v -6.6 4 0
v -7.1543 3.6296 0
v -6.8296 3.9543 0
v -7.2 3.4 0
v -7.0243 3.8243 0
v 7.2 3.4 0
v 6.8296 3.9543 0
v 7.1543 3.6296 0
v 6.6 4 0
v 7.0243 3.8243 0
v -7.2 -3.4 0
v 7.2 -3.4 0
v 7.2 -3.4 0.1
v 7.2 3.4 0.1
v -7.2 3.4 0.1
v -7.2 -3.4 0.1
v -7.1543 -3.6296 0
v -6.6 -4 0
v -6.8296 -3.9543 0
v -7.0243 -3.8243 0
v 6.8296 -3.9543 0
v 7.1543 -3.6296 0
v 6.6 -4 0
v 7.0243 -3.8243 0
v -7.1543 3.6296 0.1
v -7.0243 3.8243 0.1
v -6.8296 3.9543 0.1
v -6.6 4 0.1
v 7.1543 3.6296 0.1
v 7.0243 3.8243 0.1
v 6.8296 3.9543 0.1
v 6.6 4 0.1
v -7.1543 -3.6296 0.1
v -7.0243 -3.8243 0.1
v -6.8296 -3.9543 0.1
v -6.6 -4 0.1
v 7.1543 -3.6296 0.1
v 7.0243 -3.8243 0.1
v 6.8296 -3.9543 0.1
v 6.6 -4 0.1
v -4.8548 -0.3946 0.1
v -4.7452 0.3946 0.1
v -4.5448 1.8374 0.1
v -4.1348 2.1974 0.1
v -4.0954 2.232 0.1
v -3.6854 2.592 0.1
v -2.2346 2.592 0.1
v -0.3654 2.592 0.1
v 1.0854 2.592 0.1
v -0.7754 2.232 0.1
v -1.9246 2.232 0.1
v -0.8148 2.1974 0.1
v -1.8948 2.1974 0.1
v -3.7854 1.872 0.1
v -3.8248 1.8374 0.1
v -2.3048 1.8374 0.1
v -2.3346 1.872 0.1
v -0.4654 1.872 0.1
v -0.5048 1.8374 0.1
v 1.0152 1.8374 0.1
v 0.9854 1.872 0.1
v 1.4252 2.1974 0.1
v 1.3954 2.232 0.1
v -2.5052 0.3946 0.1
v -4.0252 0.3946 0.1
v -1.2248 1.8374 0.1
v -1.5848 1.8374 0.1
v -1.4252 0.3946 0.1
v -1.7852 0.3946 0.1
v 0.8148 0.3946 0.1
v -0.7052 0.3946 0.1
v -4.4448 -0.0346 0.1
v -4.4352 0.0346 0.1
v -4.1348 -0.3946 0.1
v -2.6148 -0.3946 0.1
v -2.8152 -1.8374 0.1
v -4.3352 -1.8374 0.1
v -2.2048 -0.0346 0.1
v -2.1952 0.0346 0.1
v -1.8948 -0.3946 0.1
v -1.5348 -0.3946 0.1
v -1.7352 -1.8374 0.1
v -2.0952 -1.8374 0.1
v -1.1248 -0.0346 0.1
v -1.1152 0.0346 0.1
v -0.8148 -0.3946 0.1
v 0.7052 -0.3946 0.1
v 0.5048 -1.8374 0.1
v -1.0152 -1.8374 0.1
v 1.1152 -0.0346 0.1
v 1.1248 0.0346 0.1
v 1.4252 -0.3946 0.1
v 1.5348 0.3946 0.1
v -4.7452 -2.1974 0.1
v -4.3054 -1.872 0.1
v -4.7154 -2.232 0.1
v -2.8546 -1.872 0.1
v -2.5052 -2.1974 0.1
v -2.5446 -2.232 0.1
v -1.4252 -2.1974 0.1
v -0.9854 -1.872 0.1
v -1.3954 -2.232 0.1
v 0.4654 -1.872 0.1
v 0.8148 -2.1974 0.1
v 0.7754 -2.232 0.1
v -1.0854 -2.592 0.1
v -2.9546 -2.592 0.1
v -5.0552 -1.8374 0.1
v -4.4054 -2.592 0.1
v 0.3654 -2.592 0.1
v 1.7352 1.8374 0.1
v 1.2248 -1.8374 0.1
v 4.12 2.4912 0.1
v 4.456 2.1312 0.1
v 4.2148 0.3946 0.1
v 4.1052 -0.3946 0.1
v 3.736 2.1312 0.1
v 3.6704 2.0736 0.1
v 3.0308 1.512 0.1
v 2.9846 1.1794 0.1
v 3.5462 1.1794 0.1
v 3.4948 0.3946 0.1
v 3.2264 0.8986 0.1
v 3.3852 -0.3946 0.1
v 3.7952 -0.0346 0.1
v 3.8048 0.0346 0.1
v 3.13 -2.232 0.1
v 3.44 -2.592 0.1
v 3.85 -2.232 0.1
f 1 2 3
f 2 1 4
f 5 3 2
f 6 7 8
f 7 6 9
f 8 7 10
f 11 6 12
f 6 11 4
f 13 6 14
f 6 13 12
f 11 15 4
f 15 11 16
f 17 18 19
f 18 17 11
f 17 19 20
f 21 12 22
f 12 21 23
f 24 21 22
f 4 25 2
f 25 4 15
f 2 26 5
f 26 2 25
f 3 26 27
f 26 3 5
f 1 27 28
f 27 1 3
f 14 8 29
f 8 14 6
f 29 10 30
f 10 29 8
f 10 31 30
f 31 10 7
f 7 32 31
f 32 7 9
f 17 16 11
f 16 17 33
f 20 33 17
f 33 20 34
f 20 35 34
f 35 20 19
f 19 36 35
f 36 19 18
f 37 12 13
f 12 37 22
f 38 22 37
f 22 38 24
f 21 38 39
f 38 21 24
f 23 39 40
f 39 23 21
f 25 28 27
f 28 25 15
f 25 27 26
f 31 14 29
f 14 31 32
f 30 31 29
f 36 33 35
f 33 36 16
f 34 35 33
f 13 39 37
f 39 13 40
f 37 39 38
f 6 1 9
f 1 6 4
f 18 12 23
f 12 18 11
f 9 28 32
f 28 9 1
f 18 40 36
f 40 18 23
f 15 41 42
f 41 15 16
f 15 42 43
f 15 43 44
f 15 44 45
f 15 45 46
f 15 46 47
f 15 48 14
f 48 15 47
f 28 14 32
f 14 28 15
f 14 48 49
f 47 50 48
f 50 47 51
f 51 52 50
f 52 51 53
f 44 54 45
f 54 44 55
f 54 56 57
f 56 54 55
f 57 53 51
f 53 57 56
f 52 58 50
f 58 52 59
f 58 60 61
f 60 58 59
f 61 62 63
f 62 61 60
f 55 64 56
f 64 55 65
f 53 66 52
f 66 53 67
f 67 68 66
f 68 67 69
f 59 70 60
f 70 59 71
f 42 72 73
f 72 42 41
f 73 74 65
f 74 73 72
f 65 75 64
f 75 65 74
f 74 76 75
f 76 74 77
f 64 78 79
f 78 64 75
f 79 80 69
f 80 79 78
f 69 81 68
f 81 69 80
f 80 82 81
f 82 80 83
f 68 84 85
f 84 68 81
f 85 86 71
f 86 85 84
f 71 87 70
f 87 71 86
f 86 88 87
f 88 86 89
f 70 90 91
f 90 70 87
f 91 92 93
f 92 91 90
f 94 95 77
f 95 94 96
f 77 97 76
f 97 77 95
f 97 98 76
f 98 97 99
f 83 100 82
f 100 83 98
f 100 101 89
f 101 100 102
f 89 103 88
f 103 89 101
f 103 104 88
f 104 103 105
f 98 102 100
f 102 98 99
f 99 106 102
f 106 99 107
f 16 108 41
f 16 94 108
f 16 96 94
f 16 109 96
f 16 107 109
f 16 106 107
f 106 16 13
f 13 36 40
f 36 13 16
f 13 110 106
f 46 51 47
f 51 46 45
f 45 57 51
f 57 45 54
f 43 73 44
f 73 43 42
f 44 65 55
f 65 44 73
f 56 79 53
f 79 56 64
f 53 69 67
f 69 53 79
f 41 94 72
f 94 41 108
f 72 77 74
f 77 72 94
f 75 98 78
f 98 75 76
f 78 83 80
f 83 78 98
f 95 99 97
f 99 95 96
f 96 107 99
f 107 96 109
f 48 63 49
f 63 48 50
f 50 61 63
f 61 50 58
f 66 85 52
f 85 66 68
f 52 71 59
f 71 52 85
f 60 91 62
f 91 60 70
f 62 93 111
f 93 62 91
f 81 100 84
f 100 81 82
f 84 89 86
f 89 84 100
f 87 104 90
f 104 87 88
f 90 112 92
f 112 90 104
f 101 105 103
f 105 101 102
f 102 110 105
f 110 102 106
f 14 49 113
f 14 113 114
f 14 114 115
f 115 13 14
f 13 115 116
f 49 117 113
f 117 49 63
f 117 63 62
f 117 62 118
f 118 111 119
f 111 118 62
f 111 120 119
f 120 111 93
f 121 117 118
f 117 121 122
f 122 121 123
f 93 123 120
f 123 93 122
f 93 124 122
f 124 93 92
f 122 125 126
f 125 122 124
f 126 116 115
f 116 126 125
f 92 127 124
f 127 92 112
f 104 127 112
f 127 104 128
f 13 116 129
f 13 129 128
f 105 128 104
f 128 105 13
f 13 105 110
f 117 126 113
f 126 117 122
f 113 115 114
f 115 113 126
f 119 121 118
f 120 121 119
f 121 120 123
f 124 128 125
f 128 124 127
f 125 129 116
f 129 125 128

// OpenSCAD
// file: ../p/box3u12.scad
use <../lib.scad>
function ldraw_lib__box3u12() = [
// 0 Box with 3 Parallel Faces without Any Edges
// 0 Name: box3u12.dat
// 0 Author: J.C. Tchang [tchang]
// 0 !LDRAW_ORG Primitive UPDATE 2014-02
// 0 !LICENSE Licensed under CC BY 4.0 : see CAreadme.txt
// 
// 0 BFC CERTIFY CCW
  [0,"BFC","CERTIFY"],
  [0,"BFC","CCW"],
// 
// 0 !HISTORY 2014-12-23 [PTadmin] Official Update 2014-02
// 
// 
// 4 16 -1 1 1 1 1 1 1 1 -1 -1 1 -1
  [4,16,-1,1,1,1,1,1,1,1,-1,-1,1,-1],
// 4 16 -1 1 1 -1 0 1 1 0 1 1 1 1
  [4,16,-1,1,1,-1,0,1,1,0,1,1,1,1],
// 4 16 1 1 -1 1 0 -1 -1 0 -1 -1 1 -1
  [4,16,1,1,-1,1,0,-1,-1,0,-1,-1,1,-1],
];
module ldraw_lib__box3u12(step=0, col=false, unit=2/5, alt=false, line=0.2, solid=!$preview)
    makepoly(ldraw_lib__box3u12(), step=step, col=col, unit=unit, alt=alt, line=line, solid=solid);
ldraw_lib__box3u12(line=0.2);
// file: ../p/1-4cyli.scad
use <../lib.scad>
function ldraw_lib__1_4cyli() = [
// 0 Cylinder 0.25
// 0 Name: 1-4cyli.dat
// 0 Author: James Jessiman
// 0 !LDRAW_ORG Primitive UPDATE 2012-01
// 0 !LICENSE Licensed under CC BY 4.0 : see CAreadme.txt
// 
// 0 BFC CERTIFY CCW
  [0,"BFC","CERTIFY"],
  [0,"BFC","CCW"],
// 
// 0 !HISTORY 2002-03-23 [sbliss] Added BFC statement.
// 0 !HISTORY 2002-04-25 [PTadmin] Official Update 2002-02
// 0 !HISTORY 2007-06-22 [PTadmin] Header formatted for Contributor Agreement
// 0 !HISTORY 2008-07-01 [PTadmin] Official Update 2008-01
// 0 !HISTORY 2012-02-16 [Philo] Changed to CCW
// 0 !HISTORY 2012-03-30 [PTadmin] Official Update 2012-01
// 
// 
// 4 16 1 1 0 0.9239 1 0.3827 0.9239 0 0.3827 1 0 0
  [4,16,1,1,0,0.9239,1,0.3827,0.9239,0,0.3827,1,0,0],
// 5 24 1 0 0 1 1 0 0.9239 0 0.3827 1 0 -1
  [5,24,1,0,0,1,1,0,0.9239,0,0.3827,1,0,-1],
// 4 16 0.9239 1 0.3827 0.7071 1 0.7071 0.7071 0 0.7071 0.9239 0 0.3827
  [4,16,0.9239,1,0.3827,0.7071,1,0.7071,0.7071,0,0.7071,0.9239,0,0.3827],
// 5 24 0.9239 0 0.3827 0.9239 1 0.3827 0.7071 0 0.7071 1 0 0
  [5,24,0.9239,0,0.3827,0.9239,1,0.3827,0.7071,0,0.7071,1,0,0],
// 4 16 0.7071 1 0.7071 0.3827 1 0.9239 0.3827 0 0.9239 0.7071 0 0.7071
  [4,16,0.7071,1,0.7071,0.3827,1,0.9239,0.3827,0,0.9239,0.7071,0,0.7071],
// 5 24 0.7071 0 0.7071 0.7071 1 0.7071 0.3827 0 0.9239 0.9239 0 0.3827
  [5,24,0.7071,0,0.7071,0.7071,1,0.7071,0.3827,0,0.9239,0.9239,0,0.3827],
// 4 16 0.3827 1 0.9239 0 1 1 0 0 1 0.3827 0 0.9239
  [4,16,0.3827,1,0.9239,0,1,1,0,0,1,0.3827,0,0.9239],
// 5 24 0.3827 0 0.9239 0.3827 1 0.9239 0 0 1 0.7071 0 0.7071
  [5,24,0.3827,0,0.9239,0.3827,1,0.9239,0,0,1,0.7071,0,0.7071],
// 5 24 0 0 1 0 1 1 0.3827 0 0.9239 -1 0 1
  [5,24,0,0,1,0,1,1,0.3827,0,0.9239,-1,0,1],
];
module ldraw_lib__1_4cyli(step=0, col=false, unit=2/5, alt=false, line=0.2, solid=!$preview)
    makepoly(ldraw_lib__1_4cyli(), step=step, col=col, unit=unit, alt=alt, line=line, solid=solid);
ldraw_lib__1_4cyli(line=0.2);
// file: ../p/1-4chrd.scad
use <../lib.scad>
function ldraw_lib__1_4chrd() = [
// 0 Chord 0.25
// 0 Name: 1-4chrd.dat
// 0 Author: Max Martin Richter [MMR1988]
// 0 !LDRAW_ORG Primitive UPDATE 2023-05
// 0 !LICENSE Licensed under CC BY 4.0 : see CAreadme.txt
// 
// 0 BFC CERTIFY CCW
  [0,"BFC","CERTIFY"],
  [0,"BFC","CCW"],
// 
// 0 !HISTORY 2004-04-22 [PTadmin] Official Update 2004-02
// 0 !HISTORY 2007-10-09 [PTadmin] Header formatted for Contributor Agreement
// 0 !HISTORY 2008-07-01 [PTadmin] Official Update 2008-01
// 0 !HISTORY 2012-08-02 [MMR1988] Re-creation with PrimGen2 and Rectifier
// 0 !HISTORY 2012-08-09 [PTadmin] Official Update 2012-02
// 0 !HISTORY 2023-10-27 [OrionP] Change author to MMR1988 from hafhead
// 0 !HISTORY 2023-10-31 [OrionP] Official Update 2023-05
// 
// 4 16 0.9239 0 0.3827 0.3827 0 0.9239 0 0 1 1 0 0
  [4,16,0.9239,0,0.3827,0.3827,0,0.9239,0,0,1,1,0,0],
// 3 16 0.7071 0 0.7071 0.3827 0 0.9239 0.9239 0 0.3827
  [3,16,0.7071,0,0.7071,0.3827,0,0.9239,0.9239,0,0.3827],
];
module ldraw_lib__1_4chrd(step=0, col=false, unit=2/5, alt=false, line=0.2, solid=!$preview)
    makepoly(ldraw_lib__1_4chrd(), step=step, col=col, unit=unit, alt=alt, line=line, solid=solid);
ldraw_lib__1_4chrd(line=0.2);
// main file
use <../lib.scad>
use <s/6221655aks01.scad>
function ldraw_lib__6221655ak() = [
// 0 Sticker  1.0 x  1.8 with Yellow Digital "1" on Black Background
// 0 Name: 6221655ak.dat
// 0 Author: Massimo Maso [Sirio]
// 0 !LDRAW_ORG Part UPDATE 2024-09
// 0 !LICENSE Licensed under CC BY 4.0 : see CAreadme.txt
// 
// 0 BFC CERTIFY CCW
  [0,"BFC","CERTIFY"],
  [0,"BFC","CCW"],
// 
// 0 !KEYWORDS 3.0, 911 RSR, Set 75888, Speed Champions, Turbo
// 
// 0 !HISTORY 2024-10-27 [OrionP] Official Update 2024-09
// 
// 0 // Subpart
// 1 16 0 0 0 1 0 0 0 1 0 0 0 1 s\6221655aks01.dat
  [1,16,0,0,0,1,0,0,0,1,0,0,0,1, ldraw_lib__s__6221655aks01()],
// 0 // Top face
// 0 // Black faces
// 3 0 18 -.25 8.5 2.7136 -.25 6.48 10.3 -.25 6.228
  [3,0,18,-.25,8.5,2.7136,-.25,6.48,10.3,-.25,6.228],
// 3 0 18 -.25 8.5 10.3 -.25 6.228 11.14 -.25 5.328
  [3,0,18,-.25,8.5,10.3,-.25,6.228,11.14,-.25,5.328],
// 3 0 18 -.25 8.5 11.14 -.25 5.328 10.537 -.25 .9864
  [3,0,18,-.25,8.5,11.14,-.25,5.328,10.537,-.25,.9864],
// 4 0 18 -.25 8.5 10.537 -.25 .9864 10.263 -.25 -.9864 18 -.25 -8.5
  [4,0,18,-.25,8.5,10.537,-.25,.9864,10.263,-.25,-.9864,18,-.25,-8.5],
// 4 0 9.34 -.25 5.328 10.3 -.25 6.228 2.7136 -.25 6.48 3.4886 -.25 5.58
  [4,0,9.34,-.25,5.328,10.3,-.25,6.228,2.7136,-.25,6.48,3.4886,-.25,5.58],
// 3 0 9.34 -.25 5.328 3.4886 -.25 5.58 3.563 -.25 5.4936
  [3,0,9.34,-.25,5.328,3.4886,-.25,5.58,3.563,-.25,5.4936],
// 3 0 9.34 -.25 5.328 3.563 -.25 5.4936 9.176 -.25 5.184
  [3,0,9.34,-.25,5.328,3.563,-.25,5.4936,9.176,-.25,5.184],
// 4 0 7.577 -.25 3.78 9.176 -.25 5.184 3.563 -.25 5.4936 4.338 -.25 4.5936
  [4,0,7.577,-.25,3.78,9.176,-.25,5.184,3.563,-.25,5.4936,4.338,-.25,4.5936],
// 4 0 7.577 -.25 3.78 4.338 -.25 4.5936 3.837 -.25 .9864 7.4615 -.25 2.9484
  [4,0,7.577,-.25,3.78,4.338,-.25,4.5936,3.837,-.25,.9864,7.4615,-.25,2.9484],
// 4 0 8.737 -.25 .9864 9.34 -.25 5.328 9.176 -.25 5.184 8.8655 -.25 2.9484
  [4,0,8.737,-.25,.9864,9.34,-.25,5.328,9.176,-.25,5.184,8.8655,-.25,2.9484],
// 3 0 8.737 -.25 .9864 8.8655 -.25 2.9484 8.066 -.25 2.2464
  [3,0,8.737,-.25,.9864,8.8655,-.25,2.9484,8.066,-.25,2.2464],
// 4 0 8.737 -.25 .9864 8.066 -.25 2.2464 7.4615 -.25 2.9484 3.837 -.25 .9864
  [4,0,8.737,-.25,.9864,8.066,-.25,2.2464,7.4615,-.25,2.9484,3.837,-.25,.9864],
// 4 0 8.737 -.25 .9864 3.837 -.25 .9864 3.563 -.25 -.9864 8.463 -.25 -.9864
  [4,0,8.737,-.25,.9864,3.837,-.25,.9864,3.563,-.25,-.9864,8.463,-.25,-.9864],
// 4 0 8.737 -.25 .9864 8.463 -.25 -.9864 9.488 -.25 -.0864 9.512 -.25 .0864
  [4,0,8.737,-.25,.9864,8.463,-.25,-.9864,9.488,-.25,-.0864,9.512,-.25,.0864],
// 4 0 10.537 -.25 .9864 9.512 -.25 .0864 9.488 -.25 -.0864 10.263 -.25 -.9864
  [4,0,10.537,-.25,.9864,9.512,-.25,.0864,9.488,-.25,-.0864,10.263,-.25,-.9864],
// 4 0 7.825 -.25 -5.58 8.463 -.25 -.9864 3.563 -.25 -.9864 3.062 -.25 -4.5936
  [4,0,7.825,-.25,-5.58,8.463,-.25,-.9864,3.563,-.25,-.9864,3.062,-.25,-4.5936],
// 4 0 7.825 -.25 -5.58 3.062 -.25 -4.5936 2.037 -.25 -5.4936 8.6 -.25 -6.48
  [4,0,7.825,-.25,-5.58,3.062,-.25,-4.5936,2.037,-.25,-5.4936,8.6,-.25,-6.48],
// 3 0 18 -.25 -8.5 10.263 -.25 -.9864 9.625 -.25 -5.58
  [3,0,18,-.25,-8.5,10.263,-.25,-.9864,9.625,-.25,-5.58],
// 3 0 18 -.25 -8.5 9.625 -.25 -5.58 8.6 -.25 -6.48
  [3,0,18,-.25,-8.5,9.625,-.25,-5.58,8.6,-.25,-6.48],
// 4 0 18 -.25 -8.5 8.6 -.25 -6.48 2.037 -.25 -5.4936 1.9386 -.25 -5.58
  [4,0,18,-.25,-8.5,8.6,-.25,-6.48,2.037,-.25,-5.4936,1.9386,-.25,-5.58],
// 3 0 18 -.25 -8.5 1.9386 -.25 -5.58 .9136 -.25 -6.48
  [3,0,18,-.25,-8.5,1.9386,-.25,-5.58,.9136,-.25,-6.48],
// 0 // Yellow number
// 4 14 10.3 -.25 6.228 9.34 -.25 5.328 8.737 -.25 .9864 9.512 -.25 .0864
  [4,14,10.3,-.25,6.228,9.34,-.25,5.328,8.737,-.25,.9864,9.512,-.25,.0864],
// 4 14 10.3 -.25 6.228 9.512 -.25 .0864 10.537 -.25 .9864 11.14 -.25 5.328
  [4,14,10.3,-.25,6.228,9.512,-.25,.0864,10.537,-.25,.9864,11.14,-.25,5.328],
// 3 14 7.577 -.25 3.78 8.8655 -.25 2.9484 9.176 -.25 5.184
  [3,14,7.577,-.25,3.78,8.8655,-.25,2.9484,9.176,-.25,5.184],
// 4 14 7.577 -.25 3.78 7.4615 -.25 2.9484 8.066 -.25 2.2464 8.8655 -.25 2.9484
  [4,14,7.577,-.25,3.78,7.4615,-.25,2.9484,8.066,-.25,2.2464,8.8655,-.25,2.9484],
// 4 14 9.488 -.25 -.0864 8.463 -.25 -.9864 7.825 -.25 -5.58 8.6 -.25 -6.48
  [4,14,9.488,-.25,-.0864,8.463,-.25,-.9864,7.825,-.25,-5.58,8.6,-.25,-6.48],
// 4 14 9.488 -.25 -.0864 8.6 -.25 -6.48 9.625 -.25 -5.58 10.263 -.25 -.9864
  [4,14,9.488,-.25,-.0864,8.6,-.25,-6.48,9.625,-.25,-5.58,10.263,-.25,-.9864],
];
module ldraw_lib__6221655ak(step=0, col=false, unit=2/5, alt=false, line=0.2, solid=!$preview)
    makepoly(ldraw_lib__6221655ak(), step=step, col=col, unit=unit, alt=alt, line=line, solid=solid);
ldraw_lib__6221655ak(line=0.2);
